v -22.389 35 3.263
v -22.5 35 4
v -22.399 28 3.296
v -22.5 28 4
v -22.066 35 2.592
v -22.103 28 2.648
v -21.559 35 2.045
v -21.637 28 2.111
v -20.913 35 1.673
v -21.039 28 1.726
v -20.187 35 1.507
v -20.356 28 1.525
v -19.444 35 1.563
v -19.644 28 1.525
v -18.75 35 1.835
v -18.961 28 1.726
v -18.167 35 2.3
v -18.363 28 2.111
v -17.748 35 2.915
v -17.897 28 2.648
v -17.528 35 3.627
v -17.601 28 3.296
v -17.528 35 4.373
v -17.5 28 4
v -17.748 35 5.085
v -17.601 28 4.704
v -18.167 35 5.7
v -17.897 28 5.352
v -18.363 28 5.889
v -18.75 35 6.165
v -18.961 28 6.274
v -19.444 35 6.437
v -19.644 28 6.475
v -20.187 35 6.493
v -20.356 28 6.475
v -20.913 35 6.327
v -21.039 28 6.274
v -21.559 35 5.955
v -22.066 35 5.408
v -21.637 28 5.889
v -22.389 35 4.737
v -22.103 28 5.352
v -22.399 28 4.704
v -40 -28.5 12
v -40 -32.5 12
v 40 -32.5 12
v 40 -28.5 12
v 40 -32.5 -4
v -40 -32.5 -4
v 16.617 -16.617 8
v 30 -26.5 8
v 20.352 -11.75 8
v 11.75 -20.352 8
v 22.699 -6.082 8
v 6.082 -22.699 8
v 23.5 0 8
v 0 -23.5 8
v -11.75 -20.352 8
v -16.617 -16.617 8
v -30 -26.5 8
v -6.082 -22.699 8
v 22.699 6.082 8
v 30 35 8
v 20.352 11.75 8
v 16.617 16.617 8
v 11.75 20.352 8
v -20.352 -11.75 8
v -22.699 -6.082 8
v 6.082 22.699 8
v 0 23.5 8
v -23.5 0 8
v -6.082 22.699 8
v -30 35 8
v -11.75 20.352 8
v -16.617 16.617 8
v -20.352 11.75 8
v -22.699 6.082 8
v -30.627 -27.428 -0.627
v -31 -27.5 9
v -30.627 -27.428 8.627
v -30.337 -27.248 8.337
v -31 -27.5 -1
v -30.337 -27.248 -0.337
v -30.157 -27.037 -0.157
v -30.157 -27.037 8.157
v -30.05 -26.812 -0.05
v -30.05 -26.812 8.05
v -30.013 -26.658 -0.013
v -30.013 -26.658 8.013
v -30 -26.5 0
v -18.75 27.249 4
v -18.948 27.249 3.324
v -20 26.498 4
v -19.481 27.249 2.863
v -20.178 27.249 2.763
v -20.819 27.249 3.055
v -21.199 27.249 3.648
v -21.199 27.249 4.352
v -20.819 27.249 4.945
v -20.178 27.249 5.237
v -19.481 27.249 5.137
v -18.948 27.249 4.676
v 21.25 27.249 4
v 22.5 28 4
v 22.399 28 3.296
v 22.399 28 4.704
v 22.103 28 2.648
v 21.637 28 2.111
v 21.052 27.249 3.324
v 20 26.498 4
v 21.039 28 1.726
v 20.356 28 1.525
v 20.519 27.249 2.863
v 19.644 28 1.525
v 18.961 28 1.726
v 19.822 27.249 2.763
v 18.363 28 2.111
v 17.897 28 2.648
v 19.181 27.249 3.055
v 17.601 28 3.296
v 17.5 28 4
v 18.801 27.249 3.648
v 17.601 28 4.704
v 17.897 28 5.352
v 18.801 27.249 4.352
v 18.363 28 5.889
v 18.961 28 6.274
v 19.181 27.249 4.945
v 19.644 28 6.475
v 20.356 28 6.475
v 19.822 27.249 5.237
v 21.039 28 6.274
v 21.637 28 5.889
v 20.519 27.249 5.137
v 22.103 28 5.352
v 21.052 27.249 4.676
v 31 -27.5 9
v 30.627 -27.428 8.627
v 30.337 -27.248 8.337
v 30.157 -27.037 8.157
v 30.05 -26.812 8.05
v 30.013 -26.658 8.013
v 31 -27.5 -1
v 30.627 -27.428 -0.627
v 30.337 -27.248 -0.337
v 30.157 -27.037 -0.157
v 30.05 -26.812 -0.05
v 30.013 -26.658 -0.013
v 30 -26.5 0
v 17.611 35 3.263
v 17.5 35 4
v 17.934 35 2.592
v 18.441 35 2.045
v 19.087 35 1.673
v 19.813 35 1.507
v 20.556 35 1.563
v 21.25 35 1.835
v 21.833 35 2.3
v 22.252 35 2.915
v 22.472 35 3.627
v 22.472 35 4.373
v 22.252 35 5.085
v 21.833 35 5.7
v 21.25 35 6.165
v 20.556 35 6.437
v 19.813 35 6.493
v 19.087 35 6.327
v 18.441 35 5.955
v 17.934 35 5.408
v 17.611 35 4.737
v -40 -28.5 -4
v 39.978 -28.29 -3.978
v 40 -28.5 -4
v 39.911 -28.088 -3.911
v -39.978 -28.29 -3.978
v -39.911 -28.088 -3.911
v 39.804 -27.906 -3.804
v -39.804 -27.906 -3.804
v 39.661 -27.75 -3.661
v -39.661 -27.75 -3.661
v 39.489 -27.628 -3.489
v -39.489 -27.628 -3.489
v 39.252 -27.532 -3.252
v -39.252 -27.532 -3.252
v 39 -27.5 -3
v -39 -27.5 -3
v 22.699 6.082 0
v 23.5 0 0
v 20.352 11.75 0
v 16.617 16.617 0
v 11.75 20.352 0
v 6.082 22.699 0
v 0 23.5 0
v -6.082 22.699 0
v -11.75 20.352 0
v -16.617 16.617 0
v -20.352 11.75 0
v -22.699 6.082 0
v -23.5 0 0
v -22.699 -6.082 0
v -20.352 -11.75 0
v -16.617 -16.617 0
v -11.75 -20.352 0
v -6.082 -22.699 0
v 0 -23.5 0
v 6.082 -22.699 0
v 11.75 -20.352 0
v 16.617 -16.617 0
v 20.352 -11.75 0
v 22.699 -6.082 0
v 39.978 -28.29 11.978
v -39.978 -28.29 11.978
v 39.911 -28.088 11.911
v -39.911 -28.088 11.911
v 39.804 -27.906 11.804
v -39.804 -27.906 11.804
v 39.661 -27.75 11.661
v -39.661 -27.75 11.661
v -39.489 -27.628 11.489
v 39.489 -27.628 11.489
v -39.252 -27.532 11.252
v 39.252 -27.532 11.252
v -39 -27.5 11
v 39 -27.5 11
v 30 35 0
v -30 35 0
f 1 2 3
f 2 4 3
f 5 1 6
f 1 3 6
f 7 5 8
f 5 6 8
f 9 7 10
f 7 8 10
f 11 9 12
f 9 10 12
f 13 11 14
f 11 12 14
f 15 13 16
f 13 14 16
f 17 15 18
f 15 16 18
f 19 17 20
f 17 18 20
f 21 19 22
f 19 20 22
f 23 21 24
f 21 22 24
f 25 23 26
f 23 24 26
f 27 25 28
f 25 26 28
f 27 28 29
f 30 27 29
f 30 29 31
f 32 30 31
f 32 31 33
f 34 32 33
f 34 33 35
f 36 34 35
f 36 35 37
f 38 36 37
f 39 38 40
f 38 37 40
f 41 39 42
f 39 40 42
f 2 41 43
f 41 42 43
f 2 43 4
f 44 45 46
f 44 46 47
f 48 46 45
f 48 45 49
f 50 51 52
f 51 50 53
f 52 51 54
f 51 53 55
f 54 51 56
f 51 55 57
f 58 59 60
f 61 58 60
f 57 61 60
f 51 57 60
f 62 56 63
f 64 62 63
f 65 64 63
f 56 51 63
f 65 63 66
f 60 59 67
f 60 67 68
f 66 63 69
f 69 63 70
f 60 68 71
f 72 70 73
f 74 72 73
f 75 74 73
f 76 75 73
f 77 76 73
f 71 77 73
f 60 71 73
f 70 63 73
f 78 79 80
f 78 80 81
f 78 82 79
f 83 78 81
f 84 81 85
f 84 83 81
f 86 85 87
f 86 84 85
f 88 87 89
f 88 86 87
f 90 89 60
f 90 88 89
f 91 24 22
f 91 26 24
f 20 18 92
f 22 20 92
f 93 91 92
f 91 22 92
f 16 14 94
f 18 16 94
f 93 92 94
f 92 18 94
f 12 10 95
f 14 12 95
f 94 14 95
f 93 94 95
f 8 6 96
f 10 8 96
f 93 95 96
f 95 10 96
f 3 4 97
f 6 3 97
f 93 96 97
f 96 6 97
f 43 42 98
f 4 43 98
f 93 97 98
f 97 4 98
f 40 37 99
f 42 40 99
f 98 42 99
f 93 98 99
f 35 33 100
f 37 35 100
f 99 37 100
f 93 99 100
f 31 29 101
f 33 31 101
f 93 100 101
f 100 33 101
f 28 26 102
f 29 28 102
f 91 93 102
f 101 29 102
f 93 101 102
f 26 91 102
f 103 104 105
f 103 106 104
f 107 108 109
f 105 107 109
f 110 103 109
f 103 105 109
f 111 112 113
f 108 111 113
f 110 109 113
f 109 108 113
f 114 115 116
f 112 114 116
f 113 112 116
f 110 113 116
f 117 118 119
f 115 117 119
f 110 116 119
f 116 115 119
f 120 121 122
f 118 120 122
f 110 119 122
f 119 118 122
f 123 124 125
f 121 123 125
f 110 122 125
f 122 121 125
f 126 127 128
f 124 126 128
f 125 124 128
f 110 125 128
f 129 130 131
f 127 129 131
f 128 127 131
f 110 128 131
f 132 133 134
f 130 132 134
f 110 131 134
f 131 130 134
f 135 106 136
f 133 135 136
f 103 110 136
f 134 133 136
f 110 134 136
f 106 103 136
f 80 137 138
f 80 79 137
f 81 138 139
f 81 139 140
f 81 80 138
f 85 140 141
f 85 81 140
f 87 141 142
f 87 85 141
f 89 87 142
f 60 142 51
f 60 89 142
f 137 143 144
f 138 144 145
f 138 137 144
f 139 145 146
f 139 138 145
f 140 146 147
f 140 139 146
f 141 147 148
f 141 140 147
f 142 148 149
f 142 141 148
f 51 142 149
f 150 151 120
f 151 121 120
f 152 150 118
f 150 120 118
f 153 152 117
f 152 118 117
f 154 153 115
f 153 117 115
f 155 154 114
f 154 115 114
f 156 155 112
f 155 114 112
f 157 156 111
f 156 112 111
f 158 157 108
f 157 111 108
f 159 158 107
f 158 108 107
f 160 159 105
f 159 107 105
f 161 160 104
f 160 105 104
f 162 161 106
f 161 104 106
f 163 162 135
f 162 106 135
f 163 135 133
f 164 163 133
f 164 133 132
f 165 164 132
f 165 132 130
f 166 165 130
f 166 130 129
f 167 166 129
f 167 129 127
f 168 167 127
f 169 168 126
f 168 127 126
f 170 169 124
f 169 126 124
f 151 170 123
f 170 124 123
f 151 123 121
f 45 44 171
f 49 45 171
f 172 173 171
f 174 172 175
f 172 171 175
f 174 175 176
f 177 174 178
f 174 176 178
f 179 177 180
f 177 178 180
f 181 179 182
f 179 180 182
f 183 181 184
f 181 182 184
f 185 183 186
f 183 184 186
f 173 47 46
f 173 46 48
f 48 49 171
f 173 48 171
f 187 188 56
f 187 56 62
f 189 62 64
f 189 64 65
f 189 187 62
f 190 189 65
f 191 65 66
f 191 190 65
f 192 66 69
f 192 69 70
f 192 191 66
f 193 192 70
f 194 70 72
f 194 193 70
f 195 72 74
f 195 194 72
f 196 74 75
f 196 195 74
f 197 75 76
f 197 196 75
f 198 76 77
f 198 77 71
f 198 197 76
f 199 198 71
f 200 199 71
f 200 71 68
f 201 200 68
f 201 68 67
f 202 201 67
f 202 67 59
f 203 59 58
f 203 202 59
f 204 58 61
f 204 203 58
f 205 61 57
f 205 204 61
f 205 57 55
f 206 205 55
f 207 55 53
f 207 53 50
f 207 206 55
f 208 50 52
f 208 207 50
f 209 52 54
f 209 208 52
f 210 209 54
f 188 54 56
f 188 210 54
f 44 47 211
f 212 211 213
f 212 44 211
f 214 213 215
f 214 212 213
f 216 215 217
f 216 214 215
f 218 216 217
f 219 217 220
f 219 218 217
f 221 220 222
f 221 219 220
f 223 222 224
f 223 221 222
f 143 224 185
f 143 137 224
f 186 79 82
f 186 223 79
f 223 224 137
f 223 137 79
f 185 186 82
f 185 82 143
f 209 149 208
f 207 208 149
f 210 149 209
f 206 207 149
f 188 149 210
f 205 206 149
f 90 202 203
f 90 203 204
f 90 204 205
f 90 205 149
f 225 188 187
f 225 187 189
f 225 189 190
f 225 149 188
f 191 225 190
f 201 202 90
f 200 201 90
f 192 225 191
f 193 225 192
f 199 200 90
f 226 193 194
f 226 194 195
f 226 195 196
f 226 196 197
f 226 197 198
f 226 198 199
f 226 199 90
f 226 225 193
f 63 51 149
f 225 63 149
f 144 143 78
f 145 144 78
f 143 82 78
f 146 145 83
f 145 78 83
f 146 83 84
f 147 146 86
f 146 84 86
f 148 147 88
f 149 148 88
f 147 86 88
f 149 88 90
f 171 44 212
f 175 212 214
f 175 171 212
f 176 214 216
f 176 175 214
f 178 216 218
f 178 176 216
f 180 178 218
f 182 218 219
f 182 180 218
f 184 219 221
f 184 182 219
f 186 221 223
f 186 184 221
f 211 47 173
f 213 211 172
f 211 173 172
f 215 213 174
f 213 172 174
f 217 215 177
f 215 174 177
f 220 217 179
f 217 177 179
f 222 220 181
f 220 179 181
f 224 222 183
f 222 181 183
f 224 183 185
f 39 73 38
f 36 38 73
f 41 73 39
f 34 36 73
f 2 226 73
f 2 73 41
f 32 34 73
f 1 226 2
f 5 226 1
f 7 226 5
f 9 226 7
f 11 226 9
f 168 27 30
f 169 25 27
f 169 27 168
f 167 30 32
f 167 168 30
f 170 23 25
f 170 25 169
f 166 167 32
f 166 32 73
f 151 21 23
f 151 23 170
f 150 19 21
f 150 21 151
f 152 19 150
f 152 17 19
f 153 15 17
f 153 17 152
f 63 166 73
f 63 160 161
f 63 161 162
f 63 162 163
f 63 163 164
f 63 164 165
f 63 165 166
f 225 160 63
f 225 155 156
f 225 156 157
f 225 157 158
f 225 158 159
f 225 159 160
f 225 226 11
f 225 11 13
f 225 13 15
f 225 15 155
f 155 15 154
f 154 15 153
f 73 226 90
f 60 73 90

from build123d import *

# Parameters (mm, degrees)
SKETCH_1_R             = 23.5
EXTRUDE_1_DEPTH        = 8
SKETCH_2_W             = 16
SKETCH_2_H             = 5
EXTRUDE_2_DEPTH        = 70
FILLET_2_R             = 1
HOLE_WIZARD_M6_1_D     = 5
HOLE_WIZARD_M6_1_DEPTH = 7
HOLE_WIZARD_M6_1_TIP   = 1.502151548


with BuildPart() as part:
    # 草图1 → 凸台-拉伸1 (new body)
    with BuildSketch(Plane.XY):
        Polygon((30, -32.5), (-30, -32.5), (-30, 0), (-30, 35), (30, 35), align=None)
        Circle(SKETCH_1_R, mode=Mode.SUBTRACT)
    extrude(amount=EXTRUDE_1_DEPTH)

    # 草图2 → 凸台-拉伸2 (add)
    with BuildSketch(Plane(origin=(30, 0, 0), x_dir=(0, 0, -1), z_dir=(1, 0, 0))):
        with Locations((-4, -30)):
            Rectangle(SKETCH_2_W, SKETCH_2_H)
    extrude_2 = extrude(amount=-EXTRUDE_2_DEPTH)

    # 镜向1: 凸台-拉伸2 across plane
    add(extrude_2.mirror(Plane.ZY))

    # 圆角2
    fillet_2_edges = [part.edges().sort_by_distance(p)[0] for p in [
        (0, -27.5, 0),
        (-40, -27.5, 4),
        (0, -27.5, 12),
        (-30, -27.5, 4),
        (0, -27.5, 8),
        (0, -27.5, -4),
        (30, -27.5, 4),
        (40, -27.5, 4),
    ]]
    fillet(fillet_2_edges, radius=FILLET_2_R)

    # M6 螺纹孔1
    with Locations(Plane(origin=(0, 35, 0), x_dir=(1, 0, 0), z_dir=(0, 1, 0))):
        with Locations((-20, -4), (20, -4)):
            Hole(HOLE_WIZARD_M6_1_D / 2, depth=HOLE_WIZARD_M6_1_DEPTH)
            with Locations((0, 0, -(HOLE_WIZARD_M6_1_DEPTH + HOLE_WIZARD_M6_1_TIP / 2))):  # 118° drill point
                Cone(0, HOLE_WIZARD_M6_1_D / 2, HOLE_WIZARD_M6_1_TIP, mode=Mode.SUBTRACT)


solid = part.part
